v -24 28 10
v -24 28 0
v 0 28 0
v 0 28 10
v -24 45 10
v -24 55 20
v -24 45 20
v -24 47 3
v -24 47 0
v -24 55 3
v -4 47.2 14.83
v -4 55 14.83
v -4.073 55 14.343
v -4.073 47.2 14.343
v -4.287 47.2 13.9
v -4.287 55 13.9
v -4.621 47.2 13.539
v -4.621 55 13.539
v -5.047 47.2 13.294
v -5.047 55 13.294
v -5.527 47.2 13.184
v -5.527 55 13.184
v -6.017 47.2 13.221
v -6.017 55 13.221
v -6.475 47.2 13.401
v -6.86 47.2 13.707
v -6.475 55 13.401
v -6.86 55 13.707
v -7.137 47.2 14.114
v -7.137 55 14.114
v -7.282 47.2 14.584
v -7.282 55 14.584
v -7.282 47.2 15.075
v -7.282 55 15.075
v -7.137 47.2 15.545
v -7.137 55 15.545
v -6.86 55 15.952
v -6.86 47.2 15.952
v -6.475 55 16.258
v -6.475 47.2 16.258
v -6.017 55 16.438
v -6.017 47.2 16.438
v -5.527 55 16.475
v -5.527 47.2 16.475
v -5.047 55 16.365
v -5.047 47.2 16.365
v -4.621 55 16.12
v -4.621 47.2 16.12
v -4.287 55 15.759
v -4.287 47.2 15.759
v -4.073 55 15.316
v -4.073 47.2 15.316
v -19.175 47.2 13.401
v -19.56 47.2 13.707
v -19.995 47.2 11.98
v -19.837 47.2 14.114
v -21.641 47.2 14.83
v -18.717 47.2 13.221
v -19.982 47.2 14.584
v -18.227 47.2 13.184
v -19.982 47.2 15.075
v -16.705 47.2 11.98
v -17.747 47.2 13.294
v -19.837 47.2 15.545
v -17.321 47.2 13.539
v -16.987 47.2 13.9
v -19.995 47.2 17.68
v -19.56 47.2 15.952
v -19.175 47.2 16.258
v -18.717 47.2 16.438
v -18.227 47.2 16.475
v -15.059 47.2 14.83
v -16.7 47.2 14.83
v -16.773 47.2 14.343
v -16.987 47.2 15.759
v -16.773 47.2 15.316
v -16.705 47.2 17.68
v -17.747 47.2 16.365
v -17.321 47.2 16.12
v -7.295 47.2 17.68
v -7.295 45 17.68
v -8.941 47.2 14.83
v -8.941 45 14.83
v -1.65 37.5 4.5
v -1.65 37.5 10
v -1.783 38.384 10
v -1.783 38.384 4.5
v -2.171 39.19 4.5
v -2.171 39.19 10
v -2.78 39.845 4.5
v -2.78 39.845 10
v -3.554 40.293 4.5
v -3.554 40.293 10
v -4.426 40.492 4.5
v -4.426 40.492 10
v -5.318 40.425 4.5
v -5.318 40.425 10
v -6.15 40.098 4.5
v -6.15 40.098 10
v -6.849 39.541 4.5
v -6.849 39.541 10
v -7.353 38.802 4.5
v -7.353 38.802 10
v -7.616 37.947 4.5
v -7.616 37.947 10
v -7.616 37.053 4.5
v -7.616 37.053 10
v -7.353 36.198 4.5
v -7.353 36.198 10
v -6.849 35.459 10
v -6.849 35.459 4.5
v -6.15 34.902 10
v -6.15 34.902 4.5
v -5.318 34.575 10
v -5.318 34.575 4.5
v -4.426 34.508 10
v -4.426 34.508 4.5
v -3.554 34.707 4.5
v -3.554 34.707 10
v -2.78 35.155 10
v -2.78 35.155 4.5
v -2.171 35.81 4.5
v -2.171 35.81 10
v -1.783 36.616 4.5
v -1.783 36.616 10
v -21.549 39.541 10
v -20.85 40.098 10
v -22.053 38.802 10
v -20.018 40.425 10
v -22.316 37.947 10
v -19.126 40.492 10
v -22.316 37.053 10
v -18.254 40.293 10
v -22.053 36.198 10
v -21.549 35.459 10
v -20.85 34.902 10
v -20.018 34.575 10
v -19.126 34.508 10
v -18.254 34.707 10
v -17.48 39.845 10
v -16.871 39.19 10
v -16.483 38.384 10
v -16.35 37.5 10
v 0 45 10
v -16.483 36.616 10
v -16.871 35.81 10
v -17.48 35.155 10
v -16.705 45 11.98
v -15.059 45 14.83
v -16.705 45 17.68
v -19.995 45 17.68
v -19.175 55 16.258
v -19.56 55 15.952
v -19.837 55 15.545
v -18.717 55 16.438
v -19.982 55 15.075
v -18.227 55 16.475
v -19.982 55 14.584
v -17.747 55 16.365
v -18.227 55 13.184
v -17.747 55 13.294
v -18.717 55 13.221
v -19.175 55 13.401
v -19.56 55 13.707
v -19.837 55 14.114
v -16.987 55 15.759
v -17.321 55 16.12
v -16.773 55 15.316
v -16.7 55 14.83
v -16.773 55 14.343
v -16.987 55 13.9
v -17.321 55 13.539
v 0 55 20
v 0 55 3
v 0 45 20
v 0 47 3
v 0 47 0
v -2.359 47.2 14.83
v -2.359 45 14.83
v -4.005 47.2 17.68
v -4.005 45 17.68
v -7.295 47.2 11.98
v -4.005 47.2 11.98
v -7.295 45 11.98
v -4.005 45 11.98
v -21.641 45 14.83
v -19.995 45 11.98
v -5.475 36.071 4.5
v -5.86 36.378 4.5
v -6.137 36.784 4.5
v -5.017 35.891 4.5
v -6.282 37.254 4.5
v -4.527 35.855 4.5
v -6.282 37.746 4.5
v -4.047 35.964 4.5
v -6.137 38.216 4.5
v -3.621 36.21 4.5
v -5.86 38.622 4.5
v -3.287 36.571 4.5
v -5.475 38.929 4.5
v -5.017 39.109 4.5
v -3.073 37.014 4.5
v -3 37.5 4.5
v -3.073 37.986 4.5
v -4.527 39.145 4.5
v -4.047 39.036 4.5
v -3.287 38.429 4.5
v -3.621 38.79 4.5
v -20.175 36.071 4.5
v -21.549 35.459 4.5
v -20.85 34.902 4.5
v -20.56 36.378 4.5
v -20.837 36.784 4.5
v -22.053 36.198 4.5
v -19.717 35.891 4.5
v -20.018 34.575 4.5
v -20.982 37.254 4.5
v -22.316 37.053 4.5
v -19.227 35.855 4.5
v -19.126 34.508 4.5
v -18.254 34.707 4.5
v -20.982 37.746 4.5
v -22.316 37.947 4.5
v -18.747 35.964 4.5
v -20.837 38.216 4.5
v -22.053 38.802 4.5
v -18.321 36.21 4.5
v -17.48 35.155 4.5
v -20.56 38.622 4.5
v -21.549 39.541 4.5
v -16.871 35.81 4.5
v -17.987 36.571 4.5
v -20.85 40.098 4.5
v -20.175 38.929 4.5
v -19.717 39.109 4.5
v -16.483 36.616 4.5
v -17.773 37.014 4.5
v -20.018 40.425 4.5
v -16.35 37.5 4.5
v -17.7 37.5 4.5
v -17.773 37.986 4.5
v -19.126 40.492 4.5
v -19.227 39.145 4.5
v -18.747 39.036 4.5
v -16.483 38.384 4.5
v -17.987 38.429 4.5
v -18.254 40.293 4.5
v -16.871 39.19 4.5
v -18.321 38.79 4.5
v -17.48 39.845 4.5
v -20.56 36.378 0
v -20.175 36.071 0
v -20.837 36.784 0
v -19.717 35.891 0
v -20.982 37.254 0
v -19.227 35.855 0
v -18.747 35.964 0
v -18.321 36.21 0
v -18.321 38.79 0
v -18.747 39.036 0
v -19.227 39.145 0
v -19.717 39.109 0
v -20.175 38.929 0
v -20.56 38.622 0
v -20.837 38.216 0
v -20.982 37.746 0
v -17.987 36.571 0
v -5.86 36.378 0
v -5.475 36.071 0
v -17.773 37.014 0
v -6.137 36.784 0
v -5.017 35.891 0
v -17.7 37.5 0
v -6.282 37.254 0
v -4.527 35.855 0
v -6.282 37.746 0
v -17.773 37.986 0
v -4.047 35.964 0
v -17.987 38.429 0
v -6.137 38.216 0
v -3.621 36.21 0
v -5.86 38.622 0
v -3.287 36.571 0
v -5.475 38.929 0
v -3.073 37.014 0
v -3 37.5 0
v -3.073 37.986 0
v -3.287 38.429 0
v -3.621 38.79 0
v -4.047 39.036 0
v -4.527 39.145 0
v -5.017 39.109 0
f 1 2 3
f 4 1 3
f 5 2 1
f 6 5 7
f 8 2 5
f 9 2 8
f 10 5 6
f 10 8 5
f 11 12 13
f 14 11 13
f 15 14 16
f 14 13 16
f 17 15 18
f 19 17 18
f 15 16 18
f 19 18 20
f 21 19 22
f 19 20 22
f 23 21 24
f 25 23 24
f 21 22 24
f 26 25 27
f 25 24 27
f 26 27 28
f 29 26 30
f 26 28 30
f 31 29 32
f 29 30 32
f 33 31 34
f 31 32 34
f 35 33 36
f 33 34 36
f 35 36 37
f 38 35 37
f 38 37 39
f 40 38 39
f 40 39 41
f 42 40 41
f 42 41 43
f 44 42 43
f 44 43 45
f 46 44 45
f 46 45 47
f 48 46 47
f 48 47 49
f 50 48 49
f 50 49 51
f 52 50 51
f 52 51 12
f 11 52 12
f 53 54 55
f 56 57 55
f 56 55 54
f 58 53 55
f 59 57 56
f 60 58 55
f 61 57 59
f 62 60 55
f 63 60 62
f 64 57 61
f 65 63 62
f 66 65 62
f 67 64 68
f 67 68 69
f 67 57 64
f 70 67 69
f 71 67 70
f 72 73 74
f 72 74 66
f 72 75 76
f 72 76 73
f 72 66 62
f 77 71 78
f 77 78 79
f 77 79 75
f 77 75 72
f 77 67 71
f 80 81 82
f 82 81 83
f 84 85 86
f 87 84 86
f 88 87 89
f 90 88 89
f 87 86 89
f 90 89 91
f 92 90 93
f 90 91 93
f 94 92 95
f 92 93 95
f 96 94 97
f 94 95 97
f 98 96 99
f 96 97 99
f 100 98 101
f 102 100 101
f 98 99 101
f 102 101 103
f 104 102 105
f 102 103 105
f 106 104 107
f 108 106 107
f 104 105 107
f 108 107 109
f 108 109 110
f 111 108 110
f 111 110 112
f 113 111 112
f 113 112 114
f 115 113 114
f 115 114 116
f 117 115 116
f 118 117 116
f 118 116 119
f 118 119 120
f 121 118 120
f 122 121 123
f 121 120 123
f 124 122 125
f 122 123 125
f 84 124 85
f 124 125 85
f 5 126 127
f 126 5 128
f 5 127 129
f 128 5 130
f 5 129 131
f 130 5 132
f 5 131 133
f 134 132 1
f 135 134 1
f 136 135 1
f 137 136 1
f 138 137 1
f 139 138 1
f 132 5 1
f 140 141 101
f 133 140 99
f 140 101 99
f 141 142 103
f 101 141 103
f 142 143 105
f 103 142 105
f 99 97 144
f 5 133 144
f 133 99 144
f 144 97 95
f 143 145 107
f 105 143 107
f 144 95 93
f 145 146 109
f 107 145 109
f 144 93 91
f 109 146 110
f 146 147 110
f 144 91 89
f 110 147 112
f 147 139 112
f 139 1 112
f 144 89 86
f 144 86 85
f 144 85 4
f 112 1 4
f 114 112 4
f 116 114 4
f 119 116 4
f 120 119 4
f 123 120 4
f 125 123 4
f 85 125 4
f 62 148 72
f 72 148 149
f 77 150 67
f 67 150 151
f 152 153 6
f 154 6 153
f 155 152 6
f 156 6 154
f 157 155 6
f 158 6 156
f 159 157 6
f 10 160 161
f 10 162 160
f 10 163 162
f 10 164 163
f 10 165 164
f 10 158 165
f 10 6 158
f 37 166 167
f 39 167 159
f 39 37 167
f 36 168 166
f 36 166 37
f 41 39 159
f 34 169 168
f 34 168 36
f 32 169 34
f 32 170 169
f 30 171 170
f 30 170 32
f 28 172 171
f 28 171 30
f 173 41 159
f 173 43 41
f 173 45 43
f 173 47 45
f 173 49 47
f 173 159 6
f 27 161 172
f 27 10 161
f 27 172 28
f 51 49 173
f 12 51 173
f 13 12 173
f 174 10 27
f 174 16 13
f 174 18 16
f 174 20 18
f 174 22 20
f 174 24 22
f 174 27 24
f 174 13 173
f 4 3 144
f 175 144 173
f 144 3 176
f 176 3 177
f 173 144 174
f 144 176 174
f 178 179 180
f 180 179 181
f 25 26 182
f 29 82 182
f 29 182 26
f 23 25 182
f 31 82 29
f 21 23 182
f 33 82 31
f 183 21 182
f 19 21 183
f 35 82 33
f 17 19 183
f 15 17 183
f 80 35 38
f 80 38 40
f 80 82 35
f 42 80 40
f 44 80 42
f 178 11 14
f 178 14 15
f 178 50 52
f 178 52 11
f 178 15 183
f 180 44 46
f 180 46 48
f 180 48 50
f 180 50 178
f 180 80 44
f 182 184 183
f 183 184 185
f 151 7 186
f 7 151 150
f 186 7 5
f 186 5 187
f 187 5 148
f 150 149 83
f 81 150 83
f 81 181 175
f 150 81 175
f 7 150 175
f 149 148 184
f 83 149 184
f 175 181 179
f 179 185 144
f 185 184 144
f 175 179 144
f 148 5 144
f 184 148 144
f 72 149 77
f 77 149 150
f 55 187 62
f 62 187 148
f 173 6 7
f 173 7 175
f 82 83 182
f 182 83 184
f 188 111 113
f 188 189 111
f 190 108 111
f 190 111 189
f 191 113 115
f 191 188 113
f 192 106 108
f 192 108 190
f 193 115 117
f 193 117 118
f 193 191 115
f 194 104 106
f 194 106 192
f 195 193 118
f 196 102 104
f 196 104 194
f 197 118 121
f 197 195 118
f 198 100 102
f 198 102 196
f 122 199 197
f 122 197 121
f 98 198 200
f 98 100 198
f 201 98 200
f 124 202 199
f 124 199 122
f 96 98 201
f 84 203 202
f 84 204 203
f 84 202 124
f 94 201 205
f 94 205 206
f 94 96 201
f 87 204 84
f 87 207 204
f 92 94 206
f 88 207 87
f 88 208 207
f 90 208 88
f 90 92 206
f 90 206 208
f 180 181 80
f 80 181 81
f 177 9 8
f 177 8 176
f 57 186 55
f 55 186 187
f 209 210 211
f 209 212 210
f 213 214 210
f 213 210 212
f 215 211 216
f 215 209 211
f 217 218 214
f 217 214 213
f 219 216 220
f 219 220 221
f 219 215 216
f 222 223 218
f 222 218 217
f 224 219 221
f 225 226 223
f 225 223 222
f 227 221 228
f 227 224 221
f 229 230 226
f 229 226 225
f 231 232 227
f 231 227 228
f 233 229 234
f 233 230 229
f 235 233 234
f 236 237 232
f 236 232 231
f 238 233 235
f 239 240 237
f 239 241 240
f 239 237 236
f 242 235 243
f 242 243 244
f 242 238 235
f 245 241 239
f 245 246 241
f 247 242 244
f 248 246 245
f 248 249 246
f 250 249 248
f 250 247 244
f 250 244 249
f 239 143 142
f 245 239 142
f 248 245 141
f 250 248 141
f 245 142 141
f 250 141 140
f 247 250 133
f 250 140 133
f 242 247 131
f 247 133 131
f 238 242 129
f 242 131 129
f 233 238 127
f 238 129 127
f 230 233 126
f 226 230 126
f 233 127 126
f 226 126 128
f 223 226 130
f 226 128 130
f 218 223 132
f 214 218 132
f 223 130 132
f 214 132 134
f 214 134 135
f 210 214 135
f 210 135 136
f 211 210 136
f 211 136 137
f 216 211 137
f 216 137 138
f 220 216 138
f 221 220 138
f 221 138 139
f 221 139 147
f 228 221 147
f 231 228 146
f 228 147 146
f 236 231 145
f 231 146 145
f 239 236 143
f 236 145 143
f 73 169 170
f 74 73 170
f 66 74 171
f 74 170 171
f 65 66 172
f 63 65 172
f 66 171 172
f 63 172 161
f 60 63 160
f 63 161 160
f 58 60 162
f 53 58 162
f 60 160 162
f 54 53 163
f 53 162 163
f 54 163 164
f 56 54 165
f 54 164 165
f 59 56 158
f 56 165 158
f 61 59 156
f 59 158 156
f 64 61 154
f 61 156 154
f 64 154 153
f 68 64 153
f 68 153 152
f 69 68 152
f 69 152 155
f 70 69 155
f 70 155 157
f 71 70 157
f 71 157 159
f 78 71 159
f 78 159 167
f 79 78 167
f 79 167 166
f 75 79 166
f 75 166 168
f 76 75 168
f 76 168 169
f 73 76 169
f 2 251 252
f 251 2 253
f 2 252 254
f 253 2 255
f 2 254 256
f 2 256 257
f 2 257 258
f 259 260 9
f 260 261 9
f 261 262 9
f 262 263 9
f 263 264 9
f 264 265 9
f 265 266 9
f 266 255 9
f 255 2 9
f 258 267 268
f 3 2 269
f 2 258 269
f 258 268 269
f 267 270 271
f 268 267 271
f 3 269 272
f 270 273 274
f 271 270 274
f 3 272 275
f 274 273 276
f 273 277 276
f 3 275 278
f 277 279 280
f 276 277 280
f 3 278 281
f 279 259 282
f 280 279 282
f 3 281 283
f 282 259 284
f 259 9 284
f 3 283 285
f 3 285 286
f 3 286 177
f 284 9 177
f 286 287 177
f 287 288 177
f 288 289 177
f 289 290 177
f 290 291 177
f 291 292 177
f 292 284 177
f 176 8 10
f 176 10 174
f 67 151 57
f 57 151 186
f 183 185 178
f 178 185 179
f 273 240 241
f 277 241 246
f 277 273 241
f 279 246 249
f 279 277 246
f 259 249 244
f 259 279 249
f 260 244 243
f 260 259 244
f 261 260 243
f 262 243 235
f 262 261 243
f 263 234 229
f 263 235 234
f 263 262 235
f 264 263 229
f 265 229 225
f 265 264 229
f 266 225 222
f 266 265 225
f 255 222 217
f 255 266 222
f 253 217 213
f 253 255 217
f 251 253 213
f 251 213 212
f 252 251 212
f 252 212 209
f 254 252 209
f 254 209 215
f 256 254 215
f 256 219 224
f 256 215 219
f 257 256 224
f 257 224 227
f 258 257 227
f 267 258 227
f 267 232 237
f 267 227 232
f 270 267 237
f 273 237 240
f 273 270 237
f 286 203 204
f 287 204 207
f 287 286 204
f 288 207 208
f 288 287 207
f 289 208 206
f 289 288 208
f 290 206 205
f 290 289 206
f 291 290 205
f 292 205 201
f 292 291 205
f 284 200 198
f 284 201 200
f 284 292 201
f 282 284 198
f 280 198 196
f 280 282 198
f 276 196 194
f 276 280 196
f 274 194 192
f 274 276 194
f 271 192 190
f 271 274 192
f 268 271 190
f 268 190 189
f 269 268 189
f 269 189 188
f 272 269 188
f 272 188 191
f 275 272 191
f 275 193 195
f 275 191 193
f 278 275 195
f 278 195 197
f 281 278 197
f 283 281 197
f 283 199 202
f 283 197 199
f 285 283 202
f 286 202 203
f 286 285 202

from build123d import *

# Parameters (mm, degrees)
SKETCH1_W           = 24
SKETCH1_H           = 19
SKETCH1_R           = 1.65
BOSS_EXTRUDE1_DEPTH = 10
SKETCH2_R           = 3
CUT_EXTRUDE1_DEPTH  = 5.5
SKETCH4_W           = 24
SKETCH4_H           = 7
BOSS_EXTRUDE2_DEPTH = 8
SKETCH6_W           = 24
SKETCH6_H           = 10
BOSS_EXTRUDE3_DEPTH = 10
SKETCH7_R           = 1.65
CUT_EXTRUDE2_DEPTH  = 28
CUT_EXTRUDE3_DEPTH  = 2.2


with BuildPart() as part:
    # Sketch1 → Boss-Extrude1 (new body)
    with BuildSketch(Plane.XY):
        with Locations((-12, 37.5)):
            Rectangle(SKETCH1_W, SKETCH1_H)
        with Locations((-19.35, 37.5)):
            Circle(SKETCH1_R, mode=Mode.SUBTRACT)
        with Locations((-4.65, 37.5)):
            Circle(SKETCH1_R, mode=Mode.SUBTRACT)
    extrude(amount=BOSS_EXTRUDE1_DEPTH)

    # Sketch2 → Cut-Extrude1 (cut)
    with BuildSketch(Plane.XY.offset(10)):
        with Locations((-4.65, 37.5)):
            Circle(SKETCH2_R)
        with Locations((-19.35, 37.5)):
            Circle(SKETCH2_R)
    extrude(amount=-CUT_EXTRUDE1_DEPTH, mode=Mode.SUBTRACT)

    # Sketch4 → Boss-Extrude2 (add)
    with BuildSketch(Plane(origin=(0, 47, 0), x_dir=(1, 0, 0), z_dir=(0, 1, 0))):
        with Locations((-12, -6.5)):
            Rectangle(SKETCH4_W, SKETCH4_H)
    extrude(amount=BOSS_EXTRUDE2_DEPTH)

    # Sketch6 → Boss-Extrude3 (add)
    with BuildSketch(Plane.XY.offset(10)):
        with Locations((-12, 50)):
            Rectangle(SKETCH6_W, SKETCH6_H)
    extrude(amount=BOSS_EXTRUDE3_DEPTH)

    # Sketch7 → Cut-Extrude2 (cut, through all)
    with BuildSketch(Plane(origin=(0, 55, 0), x_dir=(1, 0, 0), z_dir=(0, 1, 0))):
        with Locations((-5.65, -14.829504021)):
            Circle(SKETCH7_R)
        with Locations((-18.35, -14.829504021)):
            Circle(SKETCH7_R)
    extrude(amount=-CUT_EXTRUDE2_DEPTH, mode=Mode.SUBTRACT)

    # Sketch8 → Cut-Extrude3 (cut)
    with BuildSketch(Plane.XZ.offset(-45)):
        Polygon((-2.359103466, 14.829504021), (-4.004551733, 17.679504021), (-7.295448267, 17.679504021), (-8.940896534, 14.829504021), (-7.295448267, 11.979504021), (-4.004551733, 11.979504021), align=None)
        Polygon((-15.059103466, 14.829504021), (-16.704551733, 17.679504021), (-19.995448267, 17.679504021), (-21.640896534, 14.829504021), (-19.995448267, 11.979504021), (-16.704551733, 11.979504021), align=None)
    extrude(amount=-CUT_EXTRUDE3_DEPTH, mode=Mode.SUBTRACT)


solid = part.part
